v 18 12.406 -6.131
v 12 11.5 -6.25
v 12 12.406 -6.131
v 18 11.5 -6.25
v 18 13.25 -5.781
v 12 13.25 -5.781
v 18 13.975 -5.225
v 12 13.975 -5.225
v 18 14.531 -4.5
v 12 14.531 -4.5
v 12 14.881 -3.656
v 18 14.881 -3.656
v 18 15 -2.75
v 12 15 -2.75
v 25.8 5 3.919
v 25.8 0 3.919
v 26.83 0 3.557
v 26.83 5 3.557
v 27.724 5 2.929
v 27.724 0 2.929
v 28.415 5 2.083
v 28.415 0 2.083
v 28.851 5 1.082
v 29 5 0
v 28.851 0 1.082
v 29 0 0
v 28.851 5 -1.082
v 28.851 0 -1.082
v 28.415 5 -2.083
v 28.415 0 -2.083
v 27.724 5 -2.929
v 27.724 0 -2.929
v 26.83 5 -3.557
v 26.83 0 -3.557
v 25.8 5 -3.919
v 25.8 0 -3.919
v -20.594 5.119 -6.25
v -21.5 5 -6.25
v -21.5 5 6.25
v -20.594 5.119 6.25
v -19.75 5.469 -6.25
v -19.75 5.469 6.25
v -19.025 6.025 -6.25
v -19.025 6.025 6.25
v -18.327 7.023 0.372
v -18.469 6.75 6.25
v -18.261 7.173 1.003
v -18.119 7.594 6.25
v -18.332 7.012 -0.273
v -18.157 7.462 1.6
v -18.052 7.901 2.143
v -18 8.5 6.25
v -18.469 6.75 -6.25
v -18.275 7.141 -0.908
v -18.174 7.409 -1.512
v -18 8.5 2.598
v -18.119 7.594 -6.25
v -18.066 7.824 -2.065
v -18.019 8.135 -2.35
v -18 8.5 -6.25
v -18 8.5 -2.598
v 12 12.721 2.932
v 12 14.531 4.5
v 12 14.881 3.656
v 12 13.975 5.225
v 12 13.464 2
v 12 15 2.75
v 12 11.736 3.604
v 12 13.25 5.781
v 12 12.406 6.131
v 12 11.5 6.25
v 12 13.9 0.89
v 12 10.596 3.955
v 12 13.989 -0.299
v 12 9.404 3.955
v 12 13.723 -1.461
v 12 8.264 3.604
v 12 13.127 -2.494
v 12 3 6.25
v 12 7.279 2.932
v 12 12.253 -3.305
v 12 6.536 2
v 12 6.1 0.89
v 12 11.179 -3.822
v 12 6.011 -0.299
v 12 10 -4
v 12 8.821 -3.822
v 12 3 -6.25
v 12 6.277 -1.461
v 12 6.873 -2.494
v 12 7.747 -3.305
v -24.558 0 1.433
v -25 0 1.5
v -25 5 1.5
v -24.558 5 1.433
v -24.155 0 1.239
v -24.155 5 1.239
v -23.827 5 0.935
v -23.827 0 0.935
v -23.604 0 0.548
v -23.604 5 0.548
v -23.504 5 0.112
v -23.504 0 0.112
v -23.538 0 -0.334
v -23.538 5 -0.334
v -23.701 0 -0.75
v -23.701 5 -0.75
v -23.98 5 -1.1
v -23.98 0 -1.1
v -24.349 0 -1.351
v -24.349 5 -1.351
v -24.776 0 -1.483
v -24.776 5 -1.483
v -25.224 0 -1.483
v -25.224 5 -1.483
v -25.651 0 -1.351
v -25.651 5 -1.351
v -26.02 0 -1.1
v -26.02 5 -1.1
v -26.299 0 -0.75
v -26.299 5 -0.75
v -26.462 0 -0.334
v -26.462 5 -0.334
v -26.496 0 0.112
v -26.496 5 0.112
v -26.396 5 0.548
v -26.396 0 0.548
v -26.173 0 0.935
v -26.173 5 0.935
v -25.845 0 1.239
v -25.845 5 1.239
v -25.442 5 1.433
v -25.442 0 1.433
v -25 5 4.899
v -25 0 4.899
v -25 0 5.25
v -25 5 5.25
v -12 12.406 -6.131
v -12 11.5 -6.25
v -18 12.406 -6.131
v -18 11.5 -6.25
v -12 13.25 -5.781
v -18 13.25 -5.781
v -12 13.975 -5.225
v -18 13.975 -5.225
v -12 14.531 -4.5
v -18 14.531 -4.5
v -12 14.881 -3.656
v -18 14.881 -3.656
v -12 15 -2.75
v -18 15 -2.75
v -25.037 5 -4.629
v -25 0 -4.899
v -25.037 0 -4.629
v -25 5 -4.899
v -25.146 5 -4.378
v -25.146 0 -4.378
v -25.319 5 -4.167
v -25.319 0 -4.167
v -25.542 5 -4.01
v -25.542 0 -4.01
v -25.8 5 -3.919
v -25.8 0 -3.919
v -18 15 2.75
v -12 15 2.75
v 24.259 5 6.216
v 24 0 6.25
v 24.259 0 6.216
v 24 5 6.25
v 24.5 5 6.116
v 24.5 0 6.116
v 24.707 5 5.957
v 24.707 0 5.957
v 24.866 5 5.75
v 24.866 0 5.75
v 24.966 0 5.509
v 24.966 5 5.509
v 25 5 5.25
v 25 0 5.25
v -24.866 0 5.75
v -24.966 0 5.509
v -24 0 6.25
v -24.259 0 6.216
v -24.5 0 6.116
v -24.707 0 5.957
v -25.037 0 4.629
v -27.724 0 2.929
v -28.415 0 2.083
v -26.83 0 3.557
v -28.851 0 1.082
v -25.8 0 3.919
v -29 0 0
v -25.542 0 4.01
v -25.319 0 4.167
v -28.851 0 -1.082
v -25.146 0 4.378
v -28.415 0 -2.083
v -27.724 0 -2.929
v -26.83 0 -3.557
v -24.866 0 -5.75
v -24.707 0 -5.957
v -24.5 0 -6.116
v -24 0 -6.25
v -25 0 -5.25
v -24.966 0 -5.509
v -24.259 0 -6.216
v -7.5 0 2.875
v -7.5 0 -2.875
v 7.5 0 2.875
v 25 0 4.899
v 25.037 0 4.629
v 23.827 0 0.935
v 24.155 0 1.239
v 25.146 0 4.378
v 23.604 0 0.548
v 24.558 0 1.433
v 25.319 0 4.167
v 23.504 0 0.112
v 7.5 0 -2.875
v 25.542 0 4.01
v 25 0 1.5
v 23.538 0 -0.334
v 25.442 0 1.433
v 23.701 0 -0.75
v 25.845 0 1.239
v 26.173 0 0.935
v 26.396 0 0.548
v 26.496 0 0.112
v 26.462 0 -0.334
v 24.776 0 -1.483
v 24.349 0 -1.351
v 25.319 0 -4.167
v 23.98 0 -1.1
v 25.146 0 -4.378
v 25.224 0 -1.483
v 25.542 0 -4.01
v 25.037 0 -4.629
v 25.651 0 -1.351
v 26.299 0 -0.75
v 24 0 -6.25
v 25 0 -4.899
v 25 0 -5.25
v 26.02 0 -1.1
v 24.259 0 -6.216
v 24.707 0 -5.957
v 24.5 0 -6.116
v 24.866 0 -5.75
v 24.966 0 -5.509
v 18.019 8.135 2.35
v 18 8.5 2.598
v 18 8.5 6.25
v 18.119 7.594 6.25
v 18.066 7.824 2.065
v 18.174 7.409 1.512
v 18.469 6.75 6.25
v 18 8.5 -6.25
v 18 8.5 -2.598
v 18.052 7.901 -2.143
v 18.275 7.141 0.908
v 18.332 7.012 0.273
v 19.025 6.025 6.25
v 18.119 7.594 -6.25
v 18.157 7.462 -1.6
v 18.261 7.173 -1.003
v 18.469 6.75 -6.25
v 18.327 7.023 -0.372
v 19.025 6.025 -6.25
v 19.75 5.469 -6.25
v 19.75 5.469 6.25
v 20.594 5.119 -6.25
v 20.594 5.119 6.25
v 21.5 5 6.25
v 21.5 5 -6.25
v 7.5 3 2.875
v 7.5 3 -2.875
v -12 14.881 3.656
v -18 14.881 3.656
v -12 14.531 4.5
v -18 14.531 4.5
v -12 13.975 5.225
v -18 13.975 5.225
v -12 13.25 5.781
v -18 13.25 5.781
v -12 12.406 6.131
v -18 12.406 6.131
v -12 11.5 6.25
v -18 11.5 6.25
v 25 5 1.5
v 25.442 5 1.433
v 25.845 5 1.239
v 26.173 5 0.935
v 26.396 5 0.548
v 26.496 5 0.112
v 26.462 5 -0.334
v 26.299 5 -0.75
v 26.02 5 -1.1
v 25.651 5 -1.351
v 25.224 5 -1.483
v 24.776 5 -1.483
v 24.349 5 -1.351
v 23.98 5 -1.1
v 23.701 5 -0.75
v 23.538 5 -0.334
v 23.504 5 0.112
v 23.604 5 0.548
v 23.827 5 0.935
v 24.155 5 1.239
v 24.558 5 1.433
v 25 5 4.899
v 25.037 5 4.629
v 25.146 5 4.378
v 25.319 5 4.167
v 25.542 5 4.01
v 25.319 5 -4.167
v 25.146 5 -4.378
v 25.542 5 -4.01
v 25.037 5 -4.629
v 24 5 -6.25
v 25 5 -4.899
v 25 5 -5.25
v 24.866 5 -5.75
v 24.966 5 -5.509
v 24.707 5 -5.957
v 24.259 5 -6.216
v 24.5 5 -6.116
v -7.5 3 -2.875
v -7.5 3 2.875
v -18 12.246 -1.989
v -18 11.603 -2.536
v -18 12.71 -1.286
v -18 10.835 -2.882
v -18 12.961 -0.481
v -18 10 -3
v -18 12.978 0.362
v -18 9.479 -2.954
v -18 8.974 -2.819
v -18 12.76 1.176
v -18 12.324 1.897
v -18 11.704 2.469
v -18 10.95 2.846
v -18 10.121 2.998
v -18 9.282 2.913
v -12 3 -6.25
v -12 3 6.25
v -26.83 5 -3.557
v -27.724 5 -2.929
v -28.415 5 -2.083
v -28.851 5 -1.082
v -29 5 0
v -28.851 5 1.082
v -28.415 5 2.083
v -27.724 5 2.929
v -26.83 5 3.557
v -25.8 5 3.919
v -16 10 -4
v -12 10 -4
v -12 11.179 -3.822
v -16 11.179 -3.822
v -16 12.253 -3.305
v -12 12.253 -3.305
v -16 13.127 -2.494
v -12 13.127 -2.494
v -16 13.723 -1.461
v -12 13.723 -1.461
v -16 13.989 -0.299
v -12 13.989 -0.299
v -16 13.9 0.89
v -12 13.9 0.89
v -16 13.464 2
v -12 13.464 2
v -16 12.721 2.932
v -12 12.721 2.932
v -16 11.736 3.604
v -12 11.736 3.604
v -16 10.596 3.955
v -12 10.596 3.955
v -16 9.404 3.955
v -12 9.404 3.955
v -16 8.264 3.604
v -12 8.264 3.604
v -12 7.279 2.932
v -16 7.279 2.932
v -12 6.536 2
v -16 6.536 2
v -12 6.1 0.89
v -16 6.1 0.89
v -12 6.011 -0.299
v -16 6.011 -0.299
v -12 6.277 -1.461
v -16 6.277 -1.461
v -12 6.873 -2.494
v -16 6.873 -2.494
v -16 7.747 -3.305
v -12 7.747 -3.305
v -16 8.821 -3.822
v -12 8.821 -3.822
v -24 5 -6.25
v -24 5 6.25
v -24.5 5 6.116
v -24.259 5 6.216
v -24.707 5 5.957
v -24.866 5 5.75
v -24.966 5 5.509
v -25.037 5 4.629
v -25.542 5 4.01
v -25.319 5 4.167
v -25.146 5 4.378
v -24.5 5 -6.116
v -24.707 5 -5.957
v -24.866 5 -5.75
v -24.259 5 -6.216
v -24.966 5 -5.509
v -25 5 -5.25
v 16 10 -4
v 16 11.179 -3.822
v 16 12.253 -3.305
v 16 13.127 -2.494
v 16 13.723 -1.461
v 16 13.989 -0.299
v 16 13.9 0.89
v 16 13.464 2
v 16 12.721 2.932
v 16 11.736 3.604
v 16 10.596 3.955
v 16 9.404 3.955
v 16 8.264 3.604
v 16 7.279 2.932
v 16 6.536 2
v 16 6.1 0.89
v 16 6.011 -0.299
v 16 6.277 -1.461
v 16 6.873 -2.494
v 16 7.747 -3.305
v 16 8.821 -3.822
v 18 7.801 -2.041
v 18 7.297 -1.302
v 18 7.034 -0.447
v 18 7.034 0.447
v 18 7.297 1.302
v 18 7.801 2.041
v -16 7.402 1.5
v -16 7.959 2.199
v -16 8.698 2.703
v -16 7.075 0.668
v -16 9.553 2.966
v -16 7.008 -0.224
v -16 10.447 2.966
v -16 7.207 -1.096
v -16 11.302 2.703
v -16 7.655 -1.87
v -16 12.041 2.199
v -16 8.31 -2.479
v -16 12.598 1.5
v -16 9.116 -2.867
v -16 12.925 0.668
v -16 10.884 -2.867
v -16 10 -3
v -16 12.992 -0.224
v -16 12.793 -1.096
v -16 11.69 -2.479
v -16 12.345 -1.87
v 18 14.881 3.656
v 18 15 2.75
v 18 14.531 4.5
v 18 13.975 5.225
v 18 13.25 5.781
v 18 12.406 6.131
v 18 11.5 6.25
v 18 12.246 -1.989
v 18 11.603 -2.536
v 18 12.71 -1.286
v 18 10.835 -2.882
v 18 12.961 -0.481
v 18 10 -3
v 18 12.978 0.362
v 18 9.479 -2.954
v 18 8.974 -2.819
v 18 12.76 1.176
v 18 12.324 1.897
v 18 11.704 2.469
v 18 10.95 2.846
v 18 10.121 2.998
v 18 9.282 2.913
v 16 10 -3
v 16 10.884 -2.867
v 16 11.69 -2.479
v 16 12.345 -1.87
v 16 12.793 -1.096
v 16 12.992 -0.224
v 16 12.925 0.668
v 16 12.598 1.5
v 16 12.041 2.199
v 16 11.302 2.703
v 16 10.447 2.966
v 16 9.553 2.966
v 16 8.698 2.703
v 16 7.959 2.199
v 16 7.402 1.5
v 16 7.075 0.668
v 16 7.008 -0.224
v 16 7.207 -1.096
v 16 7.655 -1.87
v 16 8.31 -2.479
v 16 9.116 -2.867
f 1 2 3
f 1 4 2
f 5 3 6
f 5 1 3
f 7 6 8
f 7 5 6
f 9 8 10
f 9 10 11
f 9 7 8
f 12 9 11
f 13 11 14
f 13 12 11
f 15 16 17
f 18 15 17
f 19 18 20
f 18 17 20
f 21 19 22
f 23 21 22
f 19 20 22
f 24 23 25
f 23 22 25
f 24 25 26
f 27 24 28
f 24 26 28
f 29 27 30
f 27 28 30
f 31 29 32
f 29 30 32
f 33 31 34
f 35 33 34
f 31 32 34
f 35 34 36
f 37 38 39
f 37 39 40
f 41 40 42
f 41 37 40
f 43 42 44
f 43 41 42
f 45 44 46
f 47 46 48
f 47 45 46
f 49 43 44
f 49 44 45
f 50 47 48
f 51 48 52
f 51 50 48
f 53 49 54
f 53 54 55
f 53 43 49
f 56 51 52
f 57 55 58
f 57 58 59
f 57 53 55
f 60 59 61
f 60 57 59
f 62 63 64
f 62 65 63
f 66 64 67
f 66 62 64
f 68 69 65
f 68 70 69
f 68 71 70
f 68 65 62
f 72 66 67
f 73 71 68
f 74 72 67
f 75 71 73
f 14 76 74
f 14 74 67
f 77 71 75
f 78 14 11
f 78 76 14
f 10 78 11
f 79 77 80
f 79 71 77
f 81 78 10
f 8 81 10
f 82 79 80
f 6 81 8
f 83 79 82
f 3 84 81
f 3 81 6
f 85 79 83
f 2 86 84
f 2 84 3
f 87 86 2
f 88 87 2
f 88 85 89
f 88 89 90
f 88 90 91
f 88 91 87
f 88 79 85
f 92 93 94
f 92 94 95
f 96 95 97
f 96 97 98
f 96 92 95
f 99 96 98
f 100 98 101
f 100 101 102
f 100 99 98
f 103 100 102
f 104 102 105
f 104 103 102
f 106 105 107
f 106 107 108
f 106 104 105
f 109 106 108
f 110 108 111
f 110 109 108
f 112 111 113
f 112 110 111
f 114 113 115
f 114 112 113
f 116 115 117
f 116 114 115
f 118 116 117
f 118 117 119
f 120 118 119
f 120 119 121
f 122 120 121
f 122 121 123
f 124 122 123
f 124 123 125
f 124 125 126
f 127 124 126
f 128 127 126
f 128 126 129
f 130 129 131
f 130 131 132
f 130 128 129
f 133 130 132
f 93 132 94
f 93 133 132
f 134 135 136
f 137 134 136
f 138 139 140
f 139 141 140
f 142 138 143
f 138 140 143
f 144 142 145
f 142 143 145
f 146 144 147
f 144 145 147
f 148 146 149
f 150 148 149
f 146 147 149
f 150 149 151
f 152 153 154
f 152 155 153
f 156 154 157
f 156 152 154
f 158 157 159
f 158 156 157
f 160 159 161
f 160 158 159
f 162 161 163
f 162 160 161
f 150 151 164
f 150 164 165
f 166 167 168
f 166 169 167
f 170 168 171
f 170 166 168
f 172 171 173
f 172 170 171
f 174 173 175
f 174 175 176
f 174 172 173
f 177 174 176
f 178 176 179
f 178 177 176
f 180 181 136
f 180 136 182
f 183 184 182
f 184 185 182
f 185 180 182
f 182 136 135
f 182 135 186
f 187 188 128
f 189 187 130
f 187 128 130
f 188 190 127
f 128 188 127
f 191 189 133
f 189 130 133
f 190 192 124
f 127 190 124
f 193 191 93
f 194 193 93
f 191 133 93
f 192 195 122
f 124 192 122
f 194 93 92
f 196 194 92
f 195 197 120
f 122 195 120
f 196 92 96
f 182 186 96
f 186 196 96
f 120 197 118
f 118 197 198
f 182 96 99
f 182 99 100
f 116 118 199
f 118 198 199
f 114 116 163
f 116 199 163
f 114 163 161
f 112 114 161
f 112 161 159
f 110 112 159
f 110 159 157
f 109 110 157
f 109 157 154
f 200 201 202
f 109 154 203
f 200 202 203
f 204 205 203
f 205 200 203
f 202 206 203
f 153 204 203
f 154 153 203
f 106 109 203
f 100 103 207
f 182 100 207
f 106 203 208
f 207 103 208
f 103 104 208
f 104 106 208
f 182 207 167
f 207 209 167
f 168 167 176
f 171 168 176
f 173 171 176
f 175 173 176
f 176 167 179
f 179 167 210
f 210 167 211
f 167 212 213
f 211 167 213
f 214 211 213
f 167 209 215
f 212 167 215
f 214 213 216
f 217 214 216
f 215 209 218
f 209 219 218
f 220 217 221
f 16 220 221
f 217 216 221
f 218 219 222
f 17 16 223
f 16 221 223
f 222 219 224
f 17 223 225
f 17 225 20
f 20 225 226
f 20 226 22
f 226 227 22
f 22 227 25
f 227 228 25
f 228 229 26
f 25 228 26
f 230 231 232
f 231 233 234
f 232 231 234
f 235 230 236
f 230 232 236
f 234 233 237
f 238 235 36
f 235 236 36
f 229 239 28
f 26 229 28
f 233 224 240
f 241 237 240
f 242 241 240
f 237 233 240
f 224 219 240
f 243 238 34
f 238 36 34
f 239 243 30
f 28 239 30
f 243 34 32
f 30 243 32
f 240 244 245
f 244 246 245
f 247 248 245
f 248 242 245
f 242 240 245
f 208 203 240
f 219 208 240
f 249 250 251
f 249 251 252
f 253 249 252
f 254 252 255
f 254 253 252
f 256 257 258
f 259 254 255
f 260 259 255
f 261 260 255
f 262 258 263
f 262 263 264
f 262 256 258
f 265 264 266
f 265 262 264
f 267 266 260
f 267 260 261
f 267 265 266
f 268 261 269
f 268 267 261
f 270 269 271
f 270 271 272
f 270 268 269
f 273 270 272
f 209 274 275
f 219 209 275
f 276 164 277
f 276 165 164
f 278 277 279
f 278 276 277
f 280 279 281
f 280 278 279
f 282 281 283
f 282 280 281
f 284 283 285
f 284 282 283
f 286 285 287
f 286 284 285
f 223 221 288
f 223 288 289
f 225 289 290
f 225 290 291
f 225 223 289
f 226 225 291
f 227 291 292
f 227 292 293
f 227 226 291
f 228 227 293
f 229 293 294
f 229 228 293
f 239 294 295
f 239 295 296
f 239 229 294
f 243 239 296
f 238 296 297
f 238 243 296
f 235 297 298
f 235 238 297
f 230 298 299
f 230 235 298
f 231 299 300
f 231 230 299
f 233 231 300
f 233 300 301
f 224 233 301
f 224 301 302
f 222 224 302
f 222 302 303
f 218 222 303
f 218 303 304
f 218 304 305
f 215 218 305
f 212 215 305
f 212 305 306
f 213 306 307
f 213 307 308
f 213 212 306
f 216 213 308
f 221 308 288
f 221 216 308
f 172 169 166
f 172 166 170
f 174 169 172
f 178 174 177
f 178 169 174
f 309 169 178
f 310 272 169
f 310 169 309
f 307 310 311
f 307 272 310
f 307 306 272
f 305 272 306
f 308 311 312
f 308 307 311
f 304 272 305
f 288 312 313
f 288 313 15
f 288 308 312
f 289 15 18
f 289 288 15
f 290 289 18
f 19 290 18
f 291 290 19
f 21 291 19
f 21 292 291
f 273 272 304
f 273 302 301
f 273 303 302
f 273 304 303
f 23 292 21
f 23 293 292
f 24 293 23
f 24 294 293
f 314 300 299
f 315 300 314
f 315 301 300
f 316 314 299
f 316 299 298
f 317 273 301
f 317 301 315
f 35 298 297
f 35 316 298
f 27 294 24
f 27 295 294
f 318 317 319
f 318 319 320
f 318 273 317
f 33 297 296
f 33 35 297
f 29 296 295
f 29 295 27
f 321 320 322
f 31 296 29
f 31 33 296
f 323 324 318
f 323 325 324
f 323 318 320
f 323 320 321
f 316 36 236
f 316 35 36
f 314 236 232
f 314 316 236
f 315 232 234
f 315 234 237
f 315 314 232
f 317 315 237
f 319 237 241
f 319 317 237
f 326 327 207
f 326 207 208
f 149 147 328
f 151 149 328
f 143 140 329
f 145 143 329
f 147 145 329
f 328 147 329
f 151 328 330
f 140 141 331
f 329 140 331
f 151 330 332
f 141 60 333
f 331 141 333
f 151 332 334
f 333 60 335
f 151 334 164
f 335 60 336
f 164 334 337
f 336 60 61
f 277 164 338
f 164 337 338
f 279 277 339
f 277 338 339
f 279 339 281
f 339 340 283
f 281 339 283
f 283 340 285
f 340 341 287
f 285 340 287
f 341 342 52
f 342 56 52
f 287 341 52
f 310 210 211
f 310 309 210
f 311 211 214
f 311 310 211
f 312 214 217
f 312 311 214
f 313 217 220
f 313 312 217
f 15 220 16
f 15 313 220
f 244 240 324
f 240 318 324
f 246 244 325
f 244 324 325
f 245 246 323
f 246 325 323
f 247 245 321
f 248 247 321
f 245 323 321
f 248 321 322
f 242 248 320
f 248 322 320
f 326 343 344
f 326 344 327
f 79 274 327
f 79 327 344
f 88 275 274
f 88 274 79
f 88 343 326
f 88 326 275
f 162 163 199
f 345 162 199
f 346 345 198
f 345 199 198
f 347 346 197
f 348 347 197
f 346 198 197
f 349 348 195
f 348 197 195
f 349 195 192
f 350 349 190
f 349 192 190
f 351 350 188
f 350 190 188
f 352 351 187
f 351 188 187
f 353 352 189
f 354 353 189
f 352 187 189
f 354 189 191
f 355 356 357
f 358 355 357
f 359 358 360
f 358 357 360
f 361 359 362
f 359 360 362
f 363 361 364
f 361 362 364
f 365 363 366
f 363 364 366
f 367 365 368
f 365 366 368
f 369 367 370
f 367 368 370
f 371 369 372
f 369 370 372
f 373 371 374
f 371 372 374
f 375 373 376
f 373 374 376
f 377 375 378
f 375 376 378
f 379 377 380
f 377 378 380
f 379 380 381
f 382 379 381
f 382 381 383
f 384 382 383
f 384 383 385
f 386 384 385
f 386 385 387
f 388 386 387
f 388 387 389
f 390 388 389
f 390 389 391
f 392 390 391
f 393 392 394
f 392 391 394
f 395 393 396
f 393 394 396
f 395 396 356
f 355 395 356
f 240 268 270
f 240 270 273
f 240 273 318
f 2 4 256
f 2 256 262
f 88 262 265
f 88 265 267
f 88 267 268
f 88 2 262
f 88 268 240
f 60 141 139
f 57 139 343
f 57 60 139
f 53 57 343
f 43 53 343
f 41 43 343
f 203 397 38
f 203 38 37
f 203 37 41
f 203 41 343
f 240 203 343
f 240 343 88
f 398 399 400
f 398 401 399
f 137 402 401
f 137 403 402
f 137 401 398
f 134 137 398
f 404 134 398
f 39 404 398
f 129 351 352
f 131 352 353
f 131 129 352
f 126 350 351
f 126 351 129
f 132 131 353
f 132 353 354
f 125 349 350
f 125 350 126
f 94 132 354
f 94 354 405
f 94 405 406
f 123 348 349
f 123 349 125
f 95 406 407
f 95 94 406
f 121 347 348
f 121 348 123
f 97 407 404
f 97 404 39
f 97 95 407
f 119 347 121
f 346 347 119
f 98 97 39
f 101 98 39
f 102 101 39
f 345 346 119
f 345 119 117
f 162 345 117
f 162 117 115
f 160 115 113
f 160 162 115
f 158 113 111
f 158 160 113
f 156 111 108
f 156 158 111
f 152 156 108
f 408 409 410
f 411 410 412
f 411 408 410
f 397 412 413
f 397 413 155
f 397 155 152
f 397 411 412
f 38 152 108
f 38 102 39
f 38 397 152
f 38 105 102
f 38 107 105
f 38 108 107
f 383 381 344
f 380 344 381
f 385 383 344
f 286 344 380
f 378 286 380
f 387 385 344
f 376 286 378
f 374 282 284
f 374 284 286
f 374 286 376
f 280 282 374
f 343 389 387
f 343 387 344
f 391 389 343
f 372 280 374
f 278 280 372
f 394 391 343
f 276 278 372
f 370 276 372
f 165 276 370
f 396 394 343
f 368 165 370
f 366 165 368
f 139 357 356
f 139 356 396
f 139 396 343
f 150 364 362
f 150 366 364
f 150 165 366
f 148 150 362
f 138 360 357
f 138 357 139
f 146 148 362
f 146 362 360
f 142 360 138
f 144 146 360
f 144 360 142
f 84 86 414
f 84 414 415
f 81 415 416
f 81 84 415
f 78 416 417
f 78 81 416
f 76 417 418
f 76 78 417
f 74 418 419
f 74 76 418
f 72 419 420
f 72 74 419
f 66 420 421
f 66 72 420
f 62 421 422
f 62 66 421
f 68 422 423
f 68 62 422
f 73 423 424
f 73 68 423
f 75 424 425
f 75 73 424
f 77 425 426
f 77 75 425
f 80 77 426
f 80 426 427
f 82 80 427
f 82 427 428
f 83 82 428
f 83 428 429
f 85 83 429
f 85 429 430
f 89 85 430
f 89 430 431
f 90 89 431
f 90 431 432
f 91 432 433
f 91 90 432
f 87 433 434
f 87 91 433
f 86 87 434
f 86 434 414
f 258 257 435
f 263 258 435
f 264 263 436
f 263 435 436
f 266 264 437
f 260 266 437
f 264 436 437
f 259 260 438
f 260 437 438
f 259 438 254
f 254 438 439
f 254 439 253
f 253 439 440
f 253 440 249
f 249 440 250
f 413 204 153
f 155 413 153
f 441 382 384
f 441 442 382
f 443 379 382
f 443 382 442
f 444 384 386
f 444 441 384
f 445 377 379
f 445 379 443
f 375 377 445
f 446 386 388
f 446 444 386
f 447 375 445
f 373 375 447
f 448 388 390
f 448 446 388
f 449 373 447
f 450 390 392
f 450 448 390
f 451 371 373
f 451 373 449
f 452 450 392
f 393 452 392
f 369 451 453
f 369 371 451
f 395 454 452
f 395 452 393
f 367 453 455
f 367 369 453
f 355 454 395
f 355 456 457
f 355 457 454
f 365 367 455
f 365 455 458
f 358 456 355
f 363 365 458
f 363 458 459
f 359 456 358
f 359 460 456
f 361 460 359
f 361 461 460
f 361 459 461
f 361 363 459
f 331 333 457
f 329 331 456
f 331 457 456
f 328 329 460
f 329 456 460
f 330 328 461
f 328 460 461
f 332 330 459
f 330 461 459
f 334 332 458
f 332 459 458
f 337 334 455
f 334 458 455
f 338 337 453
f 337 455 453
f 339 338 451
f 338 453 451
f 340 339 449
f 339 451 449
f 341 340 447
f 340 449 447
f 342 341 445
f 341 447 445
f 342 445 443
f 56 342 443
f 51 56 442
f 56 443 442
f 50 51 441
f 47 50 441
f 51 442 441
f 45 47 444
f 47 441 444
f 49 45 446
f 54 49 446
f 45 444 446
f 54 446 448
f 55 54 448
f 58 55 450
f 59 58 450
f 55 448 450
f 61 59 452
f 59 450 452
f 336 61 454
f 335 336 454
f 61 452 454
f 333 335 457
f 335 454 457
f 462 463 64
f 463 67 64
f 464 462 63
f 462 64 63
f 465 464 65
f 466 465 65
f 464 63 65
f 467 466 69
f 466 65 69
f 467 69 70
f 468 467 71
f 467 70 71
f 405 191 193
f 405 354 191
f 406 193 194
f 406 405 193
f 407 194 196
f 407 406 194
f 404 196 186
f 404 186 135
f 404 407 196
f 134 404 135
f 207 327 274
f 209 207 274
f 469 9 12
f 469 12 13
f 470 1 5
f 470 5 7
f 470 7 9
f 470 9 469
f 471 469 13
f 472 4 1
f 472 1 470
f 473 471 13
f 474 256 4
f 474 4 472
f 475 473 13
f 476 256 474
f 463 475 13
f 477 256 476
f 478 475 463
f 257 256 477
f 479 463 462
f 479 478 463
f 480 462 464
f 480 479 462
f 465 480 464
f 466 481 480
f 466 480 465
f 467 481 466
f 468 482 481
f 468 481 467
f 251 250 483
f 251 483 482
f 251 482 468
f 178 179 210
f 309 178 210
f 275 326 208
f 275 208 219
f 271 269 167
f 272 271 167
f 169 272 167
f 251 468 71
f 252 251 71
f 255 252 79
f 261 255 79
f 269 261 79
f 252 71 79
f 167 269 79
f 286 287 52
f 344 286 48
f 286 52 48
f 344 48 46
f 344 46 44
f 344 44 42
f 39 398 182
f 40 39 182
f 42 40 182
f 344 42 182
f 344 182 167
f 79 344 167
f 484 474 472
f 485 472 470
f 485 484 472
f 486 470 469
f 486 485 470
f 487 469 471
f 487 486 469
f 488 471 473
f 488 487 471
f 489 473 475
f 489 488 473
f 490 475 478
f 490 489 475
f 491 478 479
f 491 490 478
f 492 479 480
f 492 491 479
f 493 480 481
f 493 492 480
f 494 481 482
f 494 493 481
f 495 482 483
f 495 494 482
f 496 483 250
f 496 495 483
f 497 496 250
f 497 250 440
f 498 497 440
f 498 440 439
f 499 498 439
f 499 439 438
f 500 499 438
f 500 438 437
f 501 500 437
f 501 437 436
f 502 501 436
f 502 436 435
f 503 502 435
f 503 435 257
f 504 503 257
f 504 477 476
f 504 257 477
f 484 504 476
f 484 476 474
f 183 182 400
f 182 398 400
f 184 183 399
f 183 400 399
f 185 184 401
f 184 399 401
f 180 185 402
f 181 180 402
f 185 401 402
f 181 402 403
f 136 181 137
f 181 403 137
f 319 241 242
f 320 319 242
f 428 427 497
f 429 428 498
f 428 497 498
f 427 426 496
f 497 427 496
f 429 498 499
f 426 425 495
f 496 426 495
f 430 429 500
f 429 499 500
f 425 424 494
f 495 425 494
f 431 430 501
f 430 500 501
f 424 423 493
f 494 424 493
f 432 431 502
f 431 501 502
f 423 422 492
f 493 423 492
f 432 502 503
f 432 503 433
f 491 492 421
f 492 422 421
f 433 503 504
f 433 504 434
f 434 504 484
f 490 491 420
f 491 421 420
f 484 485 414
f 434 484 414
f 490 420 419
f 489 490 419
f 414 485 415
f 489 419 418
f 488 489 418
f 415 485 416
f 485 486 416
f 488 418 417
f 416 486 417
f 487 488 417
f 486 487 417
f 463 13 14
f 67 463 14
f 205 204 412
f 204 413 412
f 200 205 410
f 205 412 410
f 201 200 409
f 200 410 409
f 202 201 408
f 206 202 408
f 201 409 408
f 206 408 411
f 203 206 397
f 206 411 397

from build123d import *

# Parameters (mm, degrees)
SKETCH1_R           = 1.5
BOSS_EXTRUDE1_DEPTH = 5
BOSS_EXTRUDE2_DEPTH = 10
SKETCH3_R           = 4
CUT_EXTRUDE1_DEPTH  = 4
SKETCH3_3_R         = 3
CUT_EXTRUDE2_DEPTH  = 45.102862719
FILLET6_R           = 3.5
FILLET7_R           = 3.5
FILLET8_R           = 3.5
FILLET9_R           = 3.5
FILLET10_R          = 3.5
FILLET11_R          = 3.5
FILLET12_R          = 1
FILLET13_R          = 1
FILLET14_R          = 1
FILLET15_R          = 1
FILLET16_R          = 1
FILLET17_R          = 1
FILLET18_R          = 1
FILLET19_R          = 1
SKETCH4_W           = 15
SKETCH4_H           = 5.75
CUT_EXTRUDE3_DEPTH  = 32.305949934
SKETCH5_W           = 24
SKETCH5_H           = 12.5
SKETCH5_W_2         = 15
SKETCH5_H_2         = 5.75
CUT_EXTRUDE4_DEPTH  = 2


with BuildPart() as part:
    # Sketch1 → Boss-Extrude1 (new body)
    with BuildSketch(Plane(origin=(0, 0, 0), x_dir=(1, 0, 0), z_dir=(0, 1, 0))):
        with BuildLine():
            Line((-25, -4), (-25, -6.25))
            Line((-25, -6.25), (25, -6.25))
            Line((25, -6.25), (25, -4))
            ThreePointArc((25, -4), (29, 0), (25, 4))
            Line((25, 4), (25, 6.25))
            Line((25, 6.25), (-25, 6.25))
            Line((-25, 6.25), (-25, 4))
            ThreePointArc((-25, 4), (-29, 0), (-25, -4))
        make_face()
        with Locations(Location((25, 0, 0), (0, 0, 270))):
            Circle(SKETCH1_R, mode=Mode.SUBTRACT)
        with Locations(Location((-25, 0, 0), (0, 0, 270))):
            Circle(SKETCH1_R, mode=Mode.SUBTRACT)
    extrude(amount=BOSS_EXTRUDE1_DEPTH)

    # Sketch2 → Boss-Extrude2 (add)
    with BuildSketch(Plane(origin=(0, 5, 0), x_dir=(1, 0, 0), z_dir=(0, 1, 0))):
        Polygon((-18, 0), (-18, -6.25), (-12, -6.25), (-12, 6.25), (-18, 6.25), align=None)
    boss_extrude2 = extrude(amount=BOSS_EXTRUDE2_DEPTH)

    # Sketch3 → Cut-Extrude1 (cut)
    with BuildSketch(Plane(origin=(-12, 0, 0), x_dir=(0, 0, -1), z_dir=(1, 0, 0))):
        with Locations((0, 10)):
            Circle(SKETCH3_R)
    cut_extrude1 = extrude(amount=-CUT_EXTRUDE1_DEPTH, mode=Mode.SUBTRACT)

    # Sketch3<3> → Cut-Extrude2 (cut, through all)
    with BuildSketch(Plane(origin=(-12, 0, 0), x_dir=(0, 0, -1), z_dir=(1, 0, 0))):
        with Locations((0, 10)):
            Circle(SKETCH3_3_R)
    cut_extrude2 = extrude(amount=-CUT_EXTRUDE2_DEPTH, mode=Mode.SUBTRACT)

    # Fillet6
    # the kernel refuses this fillet: 3.5 mm, written as the material it adds along each edge
    with BuildSketch(Plane(origin=(-18, 5, -6.25), x_dir=(0, 1, 0), z_dir=(0, 0, 1))) as fillet6_piece_1_section:
        with BuildLine():
            CenterArc((FILLET6_R, FILLET6_R), FILLET6_R, 180, 90)
            Line((0, FILLET6_R), (0, 0))
            Line((0, 0), (FILLET6_R, 0))
        make_face()
    fillet6_piece_1 = extrude(amount=12.5, mode=Mode.PRIVATE)
    fillet6_piece_1 = fillet6_piece_1 - Plane(origin=(-18.808785758, 10, 0), x_dir=(0, 0, -1), z_dir=(1, 0, 0)) * Cylinder(3, 39, mode=Mode.PRIVATE)
    add(fillet6_piece_1)

    # Fillet7
    fillet7_edges = [part.edges().sort_by_distance(p)[0] for p in [
        (-15, 15, -6.25),
    ]]
    fillet(fillet7_edges, radius=FILLET7_R)

    # Fillet8
    fillet8_edges = [part.edges().sort_by_distance(p)[0] for p in [
        (-15, 15, 6.25),
    ]]
    fillet(fillet8_edges, radius=FILLET8_R)

    # Mirror4: Boss-Extrude2, Cut-Extrude1, Cut-Extrude2 across plane
    add(boss_extrude2.mirror(Plane(origin=(0, 0, 0), x_dir=(0, 0, 1), z_dir=(1, 0, 0))))
    add(cut_extrude1.mirror(Plane(origin=(0, 0, 0), x_dir=(0, 0, 1), z_dir=(1, 0, 0))), mode=Mode.SUBTRACT)
    add(cut_extrude2.mirror(Plane(origin=(0, 0, 0), x_dir=(0, 0, 1), z_dir=(1, 0, 0))), mode=Mode.SUBTRACT)

    # Fillet9
    fillet9_edges = [part.edges().sort_by_distance(p)[0] for p in [
        (15, 15, -6.25),
    ]]
    fillet(fillet9_edges, radius=FILLET9_R)

    # Fillet10
    fillet10_edges = [part.edges().sort_by_distance(p)[0] for p in [
        (15, 15, 6.25),
    ]]
    fillet(fillet10_edges, radius=FILLET10_R)

    # Fillet11
    # the kernel refuses this fillet: 3.5 mm, written as the material it adds along each edge
    with BuildSketch(Plane(origin=(18, 5, -6.25), x_dir=(0, 1, 0), z_dir=(0, 0, 1))) as fillet11_piece_1_section:
        with BuildLine():
            CenterArc((FILLET11_R, -FILLET11_R), FILLET11_R, 90, 90)
            Line((0, -FILLET11_R), (0, 0))
            Line((0, 0), (FILLET11_R, 0))
        make_face()
    fillet11_piece_1 = extrude(amount=12.5, mode=Mode.PRIVATE)
    fillet11_piece_1 = fillet11_piece_1 - Plane(origin=(18.808785758, 10, 0), x_dir=(0, 0, -1), z_dir=(-1, 0, 0)) * Cylinder(3, 39, mode=Mode.PRIVATE)
    add(fillet11_piece_1)

    # Fillet12
    fillet12_edges = [part.edges().sort_by_distance(p)[0] for p in [
        (25, 2.5, -6.25),
    ]]
    fillet(fillet12_edges, radius=FILLET12_R)

    # Fillet13
    fillet13_edges = [part.edges().sort_by_distance(p)[0] for p in [
        (25, 2.5, 6.25),
    ]]
    fillet(fillet13_edges, radius=FILLET13_R)

    # Fillet14
    fillet14_edges = [part.edges().sort_by_distance(p)[0] for p in [
        (-25, 2.5, 6.25),
    ]]
    fillet(fillet14_edges, radius=FILLET14_R)

    # Fillet15
    fillet15_edges = [part.edges().sort_by_distance(p)[0] for p in [
        (-25, 2.5, -6.25),
    ]]
    fillet(fillet15_edges, radius=FILLET15_R)

    # Fillet16
    fillet16_edges = [part.edges().sort_by_distance(p)[0] for p in [
        (-25, 2.5, -4),
    ]]
    fillet(fillet16_edges, radius=FILLET16_R)

    # Fillet17
    fillet17_edges = [part.edges().sort_by_distance(p)[0] for p in [
        (-25, 2.5, 4),
    ]]
    fillet(fillet17_edges, radius=FILLET17_R)

    # Fillet18
    fillet18_edges = [part.edges().sort_by_distance(p)[0] for p in [
        (25, 2.5, 4),
    ]]
    fillet(fillet18_edges, radius=FILLET18_R)

    # Fillet19
    fillet19_edges = [part.edges().sort_by_distance(p)[0] for p in [
        (25, 2.5, -4),
    ]]
    fillet(fillet19_edges, radius=FILLET19_R)

    # Sketch4 → Cut-Extrude3 (cut, through all)
    with BuildSketch(Plane(origin=(0, 5, 0), x_dir=(1, 0, 0), z_dir=(0, 1, 0))):
        Rectangle(SKETCH4_W, SKETCH4_H)
    extrude(amount=-CUT_EXTRUDE3_DEPTH, mode=Mode.SUBTRACT)

    # Sketch5 → Cut-Extrude4 (cut)
    with BuildSketch(Plane(origin=(0, 5, 0), x_dir=(1, 0, 0), z_dir=(0, 1, 0))):
        Rectangle(SKETCH5_W, SKETCH5_H)
        Rectangle(SKETCH5_W_2, SKETCH5_H_2, mode=Mode.SUBTRACT)
    extrude(amount=-CUT_EXTRUDE4_DEPTH, mode=Mode.SUBTRACT)


solid = part.part
